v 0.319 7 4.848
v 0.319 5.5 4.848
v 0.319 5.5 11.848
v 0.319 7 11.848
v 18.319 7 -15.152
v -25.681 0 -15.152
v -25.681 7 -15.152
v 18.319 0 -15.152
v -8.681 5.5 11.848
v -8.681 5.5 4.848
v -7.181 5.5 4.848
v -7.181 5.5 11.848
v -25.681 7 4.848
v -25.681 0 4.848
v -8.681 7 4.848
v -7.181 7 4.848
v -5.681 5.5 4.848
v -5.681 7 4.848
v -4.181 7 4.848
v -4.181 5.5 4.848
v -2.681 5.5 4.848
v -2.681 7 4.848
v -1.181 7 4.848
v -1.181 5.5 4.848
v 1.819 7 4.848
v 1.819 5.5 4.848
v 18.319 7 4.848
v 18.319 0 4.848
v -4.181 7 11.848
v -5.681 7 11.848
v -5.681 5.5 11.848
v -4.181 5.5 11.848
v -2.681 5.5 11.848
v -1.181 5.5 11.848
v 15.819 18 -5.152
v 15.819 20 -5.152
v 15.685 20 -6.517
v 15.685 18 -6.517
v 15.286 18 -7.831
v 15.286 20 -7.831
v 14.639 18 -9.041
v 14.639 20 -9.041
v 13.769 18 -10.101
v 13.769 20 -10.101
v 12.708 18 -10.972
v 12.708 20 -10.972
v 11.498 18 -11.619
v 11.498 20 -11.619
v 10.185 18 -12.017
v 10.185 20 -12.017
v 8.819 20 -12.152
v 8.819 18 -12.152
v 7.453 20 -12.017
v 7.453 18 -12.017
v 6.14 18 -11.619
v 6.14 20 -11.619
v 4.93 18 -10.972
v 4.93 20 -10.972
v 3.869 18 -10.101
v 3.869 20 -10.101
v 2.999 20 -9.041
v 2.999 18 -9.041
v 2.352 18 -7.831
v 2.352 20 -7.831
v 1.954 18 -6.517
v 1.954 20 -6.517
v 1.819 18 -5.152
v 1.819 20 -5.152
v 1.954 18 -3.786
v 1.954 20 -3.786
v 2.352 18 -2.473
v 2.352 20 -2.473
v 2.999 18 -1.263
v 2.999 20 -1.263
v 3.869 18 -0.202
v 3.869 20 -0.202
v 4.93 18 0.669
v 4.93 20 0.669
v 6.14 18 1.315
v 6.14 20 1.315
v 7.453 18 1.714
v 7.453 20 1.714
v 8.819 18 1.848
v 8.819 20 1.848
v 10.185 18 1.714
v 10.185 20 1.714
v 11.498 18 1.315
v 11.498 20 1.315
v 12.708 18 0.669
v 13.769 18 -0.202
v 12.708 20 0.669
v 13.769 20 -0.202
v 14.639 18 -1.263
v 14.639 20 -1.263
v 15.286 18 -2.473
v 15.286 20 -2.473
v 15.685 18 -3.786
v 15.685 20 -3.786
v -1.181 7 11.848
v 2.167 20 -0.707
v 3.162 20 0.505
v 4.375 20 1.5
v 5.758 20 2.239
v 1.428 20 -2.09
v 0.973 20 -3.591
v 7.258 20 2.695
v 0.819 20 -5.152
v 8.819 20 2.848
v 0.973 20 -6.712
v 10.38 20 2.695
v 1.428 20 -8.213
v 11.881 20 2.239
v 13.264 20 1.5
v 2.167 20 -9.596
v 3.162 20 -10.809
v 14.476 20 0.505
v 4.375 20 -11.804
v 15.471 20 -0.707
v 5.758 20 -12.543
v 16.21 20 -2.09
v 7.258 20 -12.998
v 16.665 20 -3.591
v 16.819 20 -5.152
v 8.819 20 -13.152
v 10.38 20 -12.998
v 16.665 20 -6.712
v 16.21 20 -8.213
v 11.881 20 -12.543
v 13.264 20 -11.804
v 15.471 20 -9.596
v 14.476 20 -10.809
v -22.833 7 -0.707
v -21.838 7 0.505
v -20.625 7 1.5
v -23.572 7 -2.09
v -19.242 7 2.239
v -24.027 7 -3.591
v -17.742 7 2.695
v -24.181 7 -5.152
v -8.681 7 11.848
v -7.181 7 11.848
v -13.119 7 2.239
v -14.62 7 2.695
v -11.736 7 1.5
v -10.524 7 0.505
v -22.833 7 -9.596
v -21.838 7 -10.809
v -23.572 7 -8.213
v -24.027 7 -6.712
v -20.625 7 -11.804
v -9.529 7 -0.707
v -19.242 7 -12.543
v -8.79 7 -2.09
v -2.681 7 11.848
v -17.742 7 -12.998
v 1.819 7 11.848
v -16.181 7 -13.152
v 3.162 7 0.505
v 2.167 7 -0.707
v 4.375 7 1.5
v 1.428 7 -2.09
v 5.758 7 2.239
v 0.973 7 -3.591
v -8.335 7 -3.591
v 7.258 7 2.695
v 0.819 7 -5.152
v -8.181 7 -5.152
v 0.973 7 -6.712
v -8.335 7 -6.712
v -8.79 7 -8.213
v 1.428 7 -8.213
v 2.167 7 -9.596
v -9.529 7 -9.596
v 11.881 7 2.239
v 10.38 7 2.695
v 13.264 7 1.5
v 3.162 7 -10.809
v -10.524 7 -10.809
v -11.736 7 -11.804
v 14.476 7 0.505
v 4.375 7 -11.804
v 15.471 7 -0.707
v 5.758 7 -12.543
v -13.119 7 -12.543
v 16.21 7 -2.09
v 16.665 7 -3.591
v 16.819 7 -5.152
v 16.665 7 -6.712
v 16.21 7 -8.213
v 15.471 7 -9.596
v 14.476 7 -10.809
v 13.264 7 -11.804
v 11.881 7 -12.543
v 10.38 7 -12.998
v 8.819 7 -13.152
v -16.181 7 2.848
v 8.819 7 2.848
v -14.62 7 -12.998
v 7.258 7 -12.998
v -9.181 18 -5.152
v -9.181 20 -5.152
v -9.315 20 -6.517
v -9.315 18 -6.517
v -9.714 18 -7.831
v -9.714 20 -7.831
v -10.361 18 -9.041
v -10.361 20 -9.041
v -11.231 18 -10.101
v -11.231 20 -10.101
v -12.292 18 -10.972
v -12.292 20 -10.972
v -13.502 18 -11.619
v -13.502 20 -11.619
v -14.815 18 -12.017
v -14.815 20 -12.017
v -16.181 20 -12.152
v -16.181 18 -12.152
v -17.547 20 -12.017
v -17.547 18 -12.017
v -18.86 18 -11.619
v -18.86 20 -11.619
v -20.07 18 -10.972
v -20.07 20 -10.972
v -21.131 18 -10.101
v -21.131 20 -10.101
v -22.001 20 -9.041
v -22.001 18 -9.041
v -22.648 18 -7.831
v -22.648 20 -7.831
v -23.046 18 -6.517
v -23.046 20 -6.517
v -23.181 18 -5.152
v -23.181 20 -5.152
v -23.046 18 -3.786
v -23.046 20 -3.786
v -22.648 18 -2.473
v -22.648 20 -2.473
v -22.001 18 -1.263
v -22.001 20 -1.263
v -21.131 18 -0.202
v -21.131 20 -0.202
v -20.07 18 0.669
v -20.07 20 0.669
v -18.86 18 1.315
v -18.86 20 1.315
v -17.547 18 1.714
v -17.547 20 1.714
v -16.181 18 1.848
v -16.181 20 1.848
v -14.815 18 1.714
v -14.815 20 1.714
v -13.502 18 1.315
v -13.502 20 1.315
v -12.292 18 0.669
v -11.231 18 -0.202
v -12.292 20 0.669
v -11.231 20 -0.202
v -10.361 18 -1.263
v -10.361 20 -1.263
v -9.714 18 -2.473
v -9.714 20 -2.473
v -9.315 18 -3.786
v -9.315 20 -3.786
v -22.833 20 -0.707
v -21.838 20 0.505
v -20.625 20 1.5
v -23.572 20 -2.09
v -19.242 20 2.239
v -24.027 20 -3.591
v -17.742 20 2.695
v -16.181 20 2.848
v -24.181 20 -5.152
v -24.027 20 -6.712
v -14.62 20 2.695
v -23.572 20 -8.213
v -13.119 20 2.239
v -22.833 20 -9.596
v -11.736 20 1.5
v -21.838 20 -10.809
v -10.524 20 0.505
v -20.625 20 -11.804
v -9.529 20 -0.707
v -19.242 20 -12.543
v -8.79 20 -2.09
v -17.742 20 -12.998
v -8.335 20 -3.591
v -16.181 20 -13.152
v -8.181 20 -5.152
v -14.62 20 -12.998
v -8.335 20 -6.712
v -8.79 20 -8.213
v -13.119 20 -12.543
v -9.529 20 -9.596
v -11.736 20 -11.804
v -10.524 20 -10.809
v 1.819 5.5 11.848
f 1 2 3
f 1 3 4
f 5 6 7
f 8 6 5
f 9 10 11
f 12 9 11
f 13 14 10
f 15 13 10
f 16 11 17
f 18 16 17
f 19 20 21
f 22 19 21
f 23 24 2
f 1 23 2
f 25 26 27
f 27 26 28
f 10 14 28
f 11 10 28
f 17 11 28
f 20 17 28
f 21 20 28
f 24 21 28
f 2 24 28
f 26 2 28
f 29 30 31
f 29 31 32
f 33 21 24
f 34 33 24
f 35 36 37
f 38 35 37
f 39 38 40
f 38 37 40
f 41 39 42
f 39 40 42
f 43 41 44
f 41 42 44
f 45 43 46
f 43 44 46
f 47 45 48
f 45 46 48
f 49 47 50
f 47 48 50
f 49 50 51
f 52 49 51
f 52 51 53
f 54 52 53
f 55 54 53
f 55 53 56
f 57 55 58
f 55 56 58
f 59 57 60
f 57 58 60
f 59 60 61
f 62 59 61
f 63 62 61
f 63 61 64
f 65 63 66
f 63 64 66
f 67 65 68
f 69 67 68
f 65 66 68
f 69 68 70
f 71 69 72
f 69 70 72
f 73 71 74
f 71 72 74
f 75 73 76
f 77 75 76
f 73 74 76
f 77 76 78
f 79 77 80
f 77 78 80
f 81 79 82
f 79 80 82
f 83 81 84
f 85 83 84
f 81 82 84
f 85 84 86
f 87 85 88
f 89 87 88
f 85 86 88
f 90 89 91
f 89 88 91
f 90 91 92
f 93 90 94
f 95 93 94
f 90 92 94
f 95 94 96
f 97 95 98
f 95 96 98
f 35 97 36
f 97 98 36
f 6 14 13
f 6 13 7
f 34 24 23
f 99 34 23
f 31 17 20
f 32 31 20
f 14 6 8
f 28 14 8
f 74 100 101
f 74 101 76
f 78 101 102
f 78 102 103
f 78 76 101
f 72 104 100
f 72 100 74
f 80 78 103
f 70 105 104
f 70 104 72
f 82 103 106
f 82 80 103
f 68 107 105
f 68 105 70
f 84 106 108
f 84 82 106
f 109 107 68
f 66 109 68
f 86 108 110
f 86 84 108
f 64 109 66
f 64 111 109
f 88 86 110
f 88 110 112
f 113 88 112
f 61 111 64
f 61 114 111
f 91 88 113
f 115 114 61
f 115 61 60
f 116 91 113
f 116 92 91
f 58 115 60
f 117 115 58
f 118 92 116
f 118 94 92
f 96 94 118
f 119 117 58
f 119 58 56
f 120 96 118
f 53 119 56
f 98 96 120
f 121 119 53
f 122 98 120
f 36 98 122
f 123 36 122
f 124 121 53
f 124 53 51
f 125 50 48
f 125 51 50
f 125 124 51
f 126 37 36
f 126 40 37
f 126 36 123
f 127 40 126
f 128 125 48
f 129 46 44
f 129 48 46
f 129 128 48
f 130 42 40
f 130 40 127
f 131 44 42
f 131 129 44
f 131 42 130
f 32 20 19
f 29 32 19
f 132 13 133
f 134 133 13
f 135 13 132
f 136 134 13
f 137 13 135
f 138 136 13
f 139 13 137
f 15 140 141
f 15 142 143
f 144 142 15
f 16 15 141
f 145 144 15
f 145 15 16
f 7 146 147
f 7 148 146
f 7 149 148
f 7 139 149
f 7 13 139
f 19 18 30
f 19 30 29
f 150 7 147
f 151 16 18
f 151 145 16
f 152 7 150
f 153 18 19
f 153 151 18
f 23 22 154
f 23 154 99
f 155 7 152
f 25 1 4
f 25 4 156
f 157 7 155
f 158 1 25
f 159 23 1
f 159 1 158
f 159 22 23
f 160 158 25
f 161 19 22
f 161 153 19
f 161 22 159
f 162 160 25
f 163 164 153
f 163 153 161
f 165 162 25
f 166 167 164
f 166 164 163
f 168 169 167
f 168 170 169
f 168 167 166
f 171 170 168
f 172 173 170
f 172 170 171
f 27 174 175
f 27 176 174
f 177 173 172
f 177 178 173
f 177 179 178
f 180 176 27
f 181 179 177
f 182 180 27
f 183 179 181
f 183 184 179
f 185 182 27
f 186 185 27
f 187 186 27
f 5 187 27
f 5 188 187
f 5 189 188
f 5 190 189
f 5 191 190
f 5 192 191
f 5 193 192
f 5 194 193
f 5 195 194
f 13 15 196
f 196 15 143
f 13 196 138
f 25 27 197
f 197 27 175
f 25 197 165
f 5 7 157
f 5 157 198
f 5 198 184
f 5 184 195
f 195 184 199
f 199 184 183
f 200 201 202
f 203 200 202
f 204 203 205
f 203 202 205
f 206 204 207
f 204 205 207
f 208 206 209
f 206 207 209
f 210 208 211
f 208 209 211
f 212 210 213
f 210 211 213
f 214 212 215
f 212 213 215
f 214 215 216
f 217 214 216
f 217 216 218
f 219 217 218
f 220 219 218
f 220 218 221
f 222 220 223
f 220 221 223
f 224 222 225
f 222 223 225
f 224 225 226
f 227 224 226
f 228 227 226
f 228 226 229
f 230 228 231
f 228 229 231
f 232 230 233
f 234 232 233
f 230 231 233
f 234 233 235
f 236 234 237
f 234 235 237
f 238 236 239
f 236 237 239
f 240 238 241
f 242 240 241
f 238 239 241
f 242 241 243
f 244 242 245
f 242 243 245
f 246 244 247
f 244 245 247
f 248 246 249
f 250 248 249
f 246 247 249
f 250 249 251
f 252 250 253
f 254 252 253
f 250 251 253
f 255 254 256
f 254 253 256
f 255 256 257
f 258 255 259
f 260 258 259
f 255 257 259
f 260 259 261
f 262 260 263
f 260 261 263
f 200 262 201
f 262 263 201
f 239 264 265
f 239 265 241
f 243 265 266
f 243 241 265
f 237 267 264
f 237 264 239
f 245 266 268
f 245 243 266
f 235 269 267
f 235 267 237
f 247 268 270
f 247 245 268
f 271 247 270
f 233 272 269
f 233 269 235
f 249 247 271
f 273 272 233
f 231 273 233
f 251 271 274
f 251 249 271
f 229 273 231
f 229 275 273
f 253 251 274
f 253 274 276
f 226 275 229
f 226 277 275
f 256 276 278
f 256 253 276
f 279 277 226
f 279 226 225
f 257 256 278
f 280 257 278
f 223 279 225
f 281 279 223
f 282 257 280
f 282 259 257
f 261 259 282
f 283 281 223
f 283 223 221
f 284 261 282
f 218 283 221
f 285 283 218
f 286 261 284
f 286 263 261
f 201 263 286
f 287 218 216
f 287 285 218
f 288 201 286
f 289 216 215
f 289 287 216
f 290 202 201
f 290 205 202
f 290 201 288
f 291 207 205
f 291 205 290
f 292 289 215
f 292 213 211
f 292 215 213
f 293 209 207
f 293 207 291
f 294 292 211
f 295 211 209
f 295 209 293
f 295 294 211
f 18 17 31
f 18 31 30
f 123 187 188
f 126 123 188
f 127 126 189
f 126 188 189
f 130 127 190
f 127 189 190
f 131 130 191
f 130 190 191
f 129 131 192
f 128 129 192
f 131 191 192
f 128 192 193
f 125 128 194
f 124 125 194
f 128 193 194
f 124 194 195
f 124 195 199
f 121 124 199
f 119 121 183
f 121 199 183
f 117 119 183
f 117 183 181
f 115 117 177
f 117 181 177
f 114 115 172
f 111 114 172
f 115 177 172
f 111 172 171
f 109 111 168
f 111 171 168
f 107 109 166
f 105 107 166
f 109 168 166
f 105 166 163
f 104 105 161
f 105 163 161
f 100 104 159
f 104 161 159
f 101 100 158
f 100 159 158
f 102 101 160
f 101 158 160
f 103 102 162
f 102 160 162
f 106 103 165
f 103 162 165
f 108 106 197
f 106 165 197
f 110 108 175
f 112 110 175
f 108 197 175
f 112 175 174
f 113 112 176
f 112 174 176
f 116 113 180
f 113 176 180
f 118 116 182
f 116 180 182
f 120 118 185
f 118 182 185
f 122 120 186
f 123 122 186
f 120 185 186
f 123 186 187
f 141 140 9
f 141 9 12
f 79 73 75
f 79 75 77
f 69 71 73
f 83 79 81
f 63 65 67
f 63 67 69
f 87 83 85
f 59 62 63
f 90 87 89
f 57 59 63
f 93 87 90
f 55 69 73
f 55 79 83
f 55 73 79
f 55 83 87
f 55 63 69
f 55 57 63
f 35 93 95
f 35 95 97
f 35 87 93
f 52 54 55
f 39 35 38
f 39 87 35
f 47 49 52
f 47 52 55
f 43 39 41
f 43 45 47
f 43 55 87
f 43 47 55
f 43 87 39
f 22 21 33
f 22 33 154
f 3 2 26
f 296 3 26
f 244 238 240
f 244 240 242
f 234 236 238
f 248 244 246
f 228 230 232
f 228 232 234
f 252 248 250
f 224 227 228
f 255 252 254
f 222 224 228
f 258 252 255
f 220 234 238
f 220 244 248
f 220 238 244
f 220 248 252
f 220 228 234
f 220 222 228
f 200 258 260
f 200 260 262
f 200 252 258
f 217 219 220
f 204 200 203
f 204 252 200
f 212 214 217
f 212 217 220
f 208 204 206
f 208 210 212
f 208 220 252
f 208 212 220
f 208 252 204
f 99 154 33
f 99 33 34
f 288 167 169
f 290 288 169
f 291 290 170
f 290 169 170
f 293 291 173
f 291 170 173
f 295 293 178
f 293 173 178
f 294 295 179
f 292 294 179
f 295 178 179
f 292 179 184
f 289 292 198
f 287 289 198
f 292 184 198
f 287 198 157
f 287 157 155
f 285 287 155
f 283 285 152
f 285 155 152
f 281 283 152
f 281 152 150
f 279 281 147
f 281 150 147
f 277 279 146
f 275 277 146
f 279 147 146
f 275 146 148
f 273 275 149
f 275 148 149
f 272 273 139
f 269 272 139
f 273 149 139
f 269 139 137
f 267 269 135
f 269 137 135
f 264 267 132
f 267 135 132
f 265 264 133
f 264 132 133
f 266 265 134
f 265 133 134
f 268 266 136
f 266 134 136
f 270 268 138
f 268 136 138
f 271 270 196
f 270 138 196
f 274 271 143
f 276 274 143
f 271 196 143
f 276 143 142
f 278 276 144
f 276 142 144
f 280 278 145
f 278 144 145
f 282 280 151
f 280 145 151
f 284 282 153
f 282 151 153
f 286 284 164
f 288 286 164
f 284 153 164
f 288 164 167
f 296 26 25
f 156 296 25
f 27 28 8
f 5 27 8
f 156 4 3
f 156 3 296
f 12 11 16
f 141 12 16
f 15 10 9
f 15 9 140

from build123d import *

# Parameters (mm, degrees)
SKETCH1_W           = 44
SKETCH1_H           = 20
BOSS_EXTRUDE1_DEPTH = 7
SKETCH3_R           = 8
BOSS_EXTRUDE2_DEPTH = 13
SKETCH4_R           = 7
CUT_EXTRUDE1_DEPTH  = 2
SKETCH5_W           = 1.5
SKETCH5_H           = 1.5
BOSS_EXTRUDE3_DEPTH = 7


with BuildPart() as part:
    # Sketch1 → Boss-Extrude1 (new body)
    with BuildSketch(Plane(origin=(0, 0, 0), x_dir=(1, 0, 0), z_dir=(0, 1, 0))):
        with Locations((-3.680933852, 5.151750973)):
            Rectangle(SKETCH1_W, SKETCH1_H)
    extrude(amount=BOSS_EXTRUDE1_DEPTH)

    # Sketch3 → Boss-Extrude2 (add)
    with BuildSketch(Plane(origin=(0, 7, 0), x_dir=(1, 0, 0), z_dir=(0, 1, 0))):
        with Locations((-16.180933852, 5.151750973)):
            Circle(SKETCH3_R)
        with Locations((8.819066148, 5.151750973)):
            Circle(SKETCH3_R)
    extrude(amount=BOSS_EXTRUDE2_DEPTH)

    # Sketch4 → Cut-Extrude1 (cut)
    with BuildSketch(Plane(origin=(0, 20, 0), x_dir=(1, 0, 0), z_dir=(0, 1, 0))):
        with Locations((-16.180933852, 5.151750973)):
            Circle(SKETCH4_R)
        with Locations((8.819066148, 5.151750973)):
            Circle(SKETCH4_R)
    extrude(amount=-CUT_EXTRUDE1_DEPTH, mode=Mode.SUBTRACT)

    # Sketch5 → Boss-Extrude3 (add)
    with BuildSketch(Plane.XY.offset(4.848249027)):
        with Locations((-7.930933852, 6.25)):
            Rectangle(SKETCH5_W, SKETCH5_H)
        with Locations((-4.930933852, 6.25)):
            Rectangle(SKETCH5_W, SKETCH5_H)
        with Locations((-1.930933852, 6.25)):
            Rectangle(SKETCH5_W, SKETCH5_H)
        with Locations((1.069066148, 6.25)):
            Rectangle(SKETCH5_W, SKETCH5_H)
    extrude(amount=BOSS_EXTRUDE3_DEPTH)


solid = part.part
